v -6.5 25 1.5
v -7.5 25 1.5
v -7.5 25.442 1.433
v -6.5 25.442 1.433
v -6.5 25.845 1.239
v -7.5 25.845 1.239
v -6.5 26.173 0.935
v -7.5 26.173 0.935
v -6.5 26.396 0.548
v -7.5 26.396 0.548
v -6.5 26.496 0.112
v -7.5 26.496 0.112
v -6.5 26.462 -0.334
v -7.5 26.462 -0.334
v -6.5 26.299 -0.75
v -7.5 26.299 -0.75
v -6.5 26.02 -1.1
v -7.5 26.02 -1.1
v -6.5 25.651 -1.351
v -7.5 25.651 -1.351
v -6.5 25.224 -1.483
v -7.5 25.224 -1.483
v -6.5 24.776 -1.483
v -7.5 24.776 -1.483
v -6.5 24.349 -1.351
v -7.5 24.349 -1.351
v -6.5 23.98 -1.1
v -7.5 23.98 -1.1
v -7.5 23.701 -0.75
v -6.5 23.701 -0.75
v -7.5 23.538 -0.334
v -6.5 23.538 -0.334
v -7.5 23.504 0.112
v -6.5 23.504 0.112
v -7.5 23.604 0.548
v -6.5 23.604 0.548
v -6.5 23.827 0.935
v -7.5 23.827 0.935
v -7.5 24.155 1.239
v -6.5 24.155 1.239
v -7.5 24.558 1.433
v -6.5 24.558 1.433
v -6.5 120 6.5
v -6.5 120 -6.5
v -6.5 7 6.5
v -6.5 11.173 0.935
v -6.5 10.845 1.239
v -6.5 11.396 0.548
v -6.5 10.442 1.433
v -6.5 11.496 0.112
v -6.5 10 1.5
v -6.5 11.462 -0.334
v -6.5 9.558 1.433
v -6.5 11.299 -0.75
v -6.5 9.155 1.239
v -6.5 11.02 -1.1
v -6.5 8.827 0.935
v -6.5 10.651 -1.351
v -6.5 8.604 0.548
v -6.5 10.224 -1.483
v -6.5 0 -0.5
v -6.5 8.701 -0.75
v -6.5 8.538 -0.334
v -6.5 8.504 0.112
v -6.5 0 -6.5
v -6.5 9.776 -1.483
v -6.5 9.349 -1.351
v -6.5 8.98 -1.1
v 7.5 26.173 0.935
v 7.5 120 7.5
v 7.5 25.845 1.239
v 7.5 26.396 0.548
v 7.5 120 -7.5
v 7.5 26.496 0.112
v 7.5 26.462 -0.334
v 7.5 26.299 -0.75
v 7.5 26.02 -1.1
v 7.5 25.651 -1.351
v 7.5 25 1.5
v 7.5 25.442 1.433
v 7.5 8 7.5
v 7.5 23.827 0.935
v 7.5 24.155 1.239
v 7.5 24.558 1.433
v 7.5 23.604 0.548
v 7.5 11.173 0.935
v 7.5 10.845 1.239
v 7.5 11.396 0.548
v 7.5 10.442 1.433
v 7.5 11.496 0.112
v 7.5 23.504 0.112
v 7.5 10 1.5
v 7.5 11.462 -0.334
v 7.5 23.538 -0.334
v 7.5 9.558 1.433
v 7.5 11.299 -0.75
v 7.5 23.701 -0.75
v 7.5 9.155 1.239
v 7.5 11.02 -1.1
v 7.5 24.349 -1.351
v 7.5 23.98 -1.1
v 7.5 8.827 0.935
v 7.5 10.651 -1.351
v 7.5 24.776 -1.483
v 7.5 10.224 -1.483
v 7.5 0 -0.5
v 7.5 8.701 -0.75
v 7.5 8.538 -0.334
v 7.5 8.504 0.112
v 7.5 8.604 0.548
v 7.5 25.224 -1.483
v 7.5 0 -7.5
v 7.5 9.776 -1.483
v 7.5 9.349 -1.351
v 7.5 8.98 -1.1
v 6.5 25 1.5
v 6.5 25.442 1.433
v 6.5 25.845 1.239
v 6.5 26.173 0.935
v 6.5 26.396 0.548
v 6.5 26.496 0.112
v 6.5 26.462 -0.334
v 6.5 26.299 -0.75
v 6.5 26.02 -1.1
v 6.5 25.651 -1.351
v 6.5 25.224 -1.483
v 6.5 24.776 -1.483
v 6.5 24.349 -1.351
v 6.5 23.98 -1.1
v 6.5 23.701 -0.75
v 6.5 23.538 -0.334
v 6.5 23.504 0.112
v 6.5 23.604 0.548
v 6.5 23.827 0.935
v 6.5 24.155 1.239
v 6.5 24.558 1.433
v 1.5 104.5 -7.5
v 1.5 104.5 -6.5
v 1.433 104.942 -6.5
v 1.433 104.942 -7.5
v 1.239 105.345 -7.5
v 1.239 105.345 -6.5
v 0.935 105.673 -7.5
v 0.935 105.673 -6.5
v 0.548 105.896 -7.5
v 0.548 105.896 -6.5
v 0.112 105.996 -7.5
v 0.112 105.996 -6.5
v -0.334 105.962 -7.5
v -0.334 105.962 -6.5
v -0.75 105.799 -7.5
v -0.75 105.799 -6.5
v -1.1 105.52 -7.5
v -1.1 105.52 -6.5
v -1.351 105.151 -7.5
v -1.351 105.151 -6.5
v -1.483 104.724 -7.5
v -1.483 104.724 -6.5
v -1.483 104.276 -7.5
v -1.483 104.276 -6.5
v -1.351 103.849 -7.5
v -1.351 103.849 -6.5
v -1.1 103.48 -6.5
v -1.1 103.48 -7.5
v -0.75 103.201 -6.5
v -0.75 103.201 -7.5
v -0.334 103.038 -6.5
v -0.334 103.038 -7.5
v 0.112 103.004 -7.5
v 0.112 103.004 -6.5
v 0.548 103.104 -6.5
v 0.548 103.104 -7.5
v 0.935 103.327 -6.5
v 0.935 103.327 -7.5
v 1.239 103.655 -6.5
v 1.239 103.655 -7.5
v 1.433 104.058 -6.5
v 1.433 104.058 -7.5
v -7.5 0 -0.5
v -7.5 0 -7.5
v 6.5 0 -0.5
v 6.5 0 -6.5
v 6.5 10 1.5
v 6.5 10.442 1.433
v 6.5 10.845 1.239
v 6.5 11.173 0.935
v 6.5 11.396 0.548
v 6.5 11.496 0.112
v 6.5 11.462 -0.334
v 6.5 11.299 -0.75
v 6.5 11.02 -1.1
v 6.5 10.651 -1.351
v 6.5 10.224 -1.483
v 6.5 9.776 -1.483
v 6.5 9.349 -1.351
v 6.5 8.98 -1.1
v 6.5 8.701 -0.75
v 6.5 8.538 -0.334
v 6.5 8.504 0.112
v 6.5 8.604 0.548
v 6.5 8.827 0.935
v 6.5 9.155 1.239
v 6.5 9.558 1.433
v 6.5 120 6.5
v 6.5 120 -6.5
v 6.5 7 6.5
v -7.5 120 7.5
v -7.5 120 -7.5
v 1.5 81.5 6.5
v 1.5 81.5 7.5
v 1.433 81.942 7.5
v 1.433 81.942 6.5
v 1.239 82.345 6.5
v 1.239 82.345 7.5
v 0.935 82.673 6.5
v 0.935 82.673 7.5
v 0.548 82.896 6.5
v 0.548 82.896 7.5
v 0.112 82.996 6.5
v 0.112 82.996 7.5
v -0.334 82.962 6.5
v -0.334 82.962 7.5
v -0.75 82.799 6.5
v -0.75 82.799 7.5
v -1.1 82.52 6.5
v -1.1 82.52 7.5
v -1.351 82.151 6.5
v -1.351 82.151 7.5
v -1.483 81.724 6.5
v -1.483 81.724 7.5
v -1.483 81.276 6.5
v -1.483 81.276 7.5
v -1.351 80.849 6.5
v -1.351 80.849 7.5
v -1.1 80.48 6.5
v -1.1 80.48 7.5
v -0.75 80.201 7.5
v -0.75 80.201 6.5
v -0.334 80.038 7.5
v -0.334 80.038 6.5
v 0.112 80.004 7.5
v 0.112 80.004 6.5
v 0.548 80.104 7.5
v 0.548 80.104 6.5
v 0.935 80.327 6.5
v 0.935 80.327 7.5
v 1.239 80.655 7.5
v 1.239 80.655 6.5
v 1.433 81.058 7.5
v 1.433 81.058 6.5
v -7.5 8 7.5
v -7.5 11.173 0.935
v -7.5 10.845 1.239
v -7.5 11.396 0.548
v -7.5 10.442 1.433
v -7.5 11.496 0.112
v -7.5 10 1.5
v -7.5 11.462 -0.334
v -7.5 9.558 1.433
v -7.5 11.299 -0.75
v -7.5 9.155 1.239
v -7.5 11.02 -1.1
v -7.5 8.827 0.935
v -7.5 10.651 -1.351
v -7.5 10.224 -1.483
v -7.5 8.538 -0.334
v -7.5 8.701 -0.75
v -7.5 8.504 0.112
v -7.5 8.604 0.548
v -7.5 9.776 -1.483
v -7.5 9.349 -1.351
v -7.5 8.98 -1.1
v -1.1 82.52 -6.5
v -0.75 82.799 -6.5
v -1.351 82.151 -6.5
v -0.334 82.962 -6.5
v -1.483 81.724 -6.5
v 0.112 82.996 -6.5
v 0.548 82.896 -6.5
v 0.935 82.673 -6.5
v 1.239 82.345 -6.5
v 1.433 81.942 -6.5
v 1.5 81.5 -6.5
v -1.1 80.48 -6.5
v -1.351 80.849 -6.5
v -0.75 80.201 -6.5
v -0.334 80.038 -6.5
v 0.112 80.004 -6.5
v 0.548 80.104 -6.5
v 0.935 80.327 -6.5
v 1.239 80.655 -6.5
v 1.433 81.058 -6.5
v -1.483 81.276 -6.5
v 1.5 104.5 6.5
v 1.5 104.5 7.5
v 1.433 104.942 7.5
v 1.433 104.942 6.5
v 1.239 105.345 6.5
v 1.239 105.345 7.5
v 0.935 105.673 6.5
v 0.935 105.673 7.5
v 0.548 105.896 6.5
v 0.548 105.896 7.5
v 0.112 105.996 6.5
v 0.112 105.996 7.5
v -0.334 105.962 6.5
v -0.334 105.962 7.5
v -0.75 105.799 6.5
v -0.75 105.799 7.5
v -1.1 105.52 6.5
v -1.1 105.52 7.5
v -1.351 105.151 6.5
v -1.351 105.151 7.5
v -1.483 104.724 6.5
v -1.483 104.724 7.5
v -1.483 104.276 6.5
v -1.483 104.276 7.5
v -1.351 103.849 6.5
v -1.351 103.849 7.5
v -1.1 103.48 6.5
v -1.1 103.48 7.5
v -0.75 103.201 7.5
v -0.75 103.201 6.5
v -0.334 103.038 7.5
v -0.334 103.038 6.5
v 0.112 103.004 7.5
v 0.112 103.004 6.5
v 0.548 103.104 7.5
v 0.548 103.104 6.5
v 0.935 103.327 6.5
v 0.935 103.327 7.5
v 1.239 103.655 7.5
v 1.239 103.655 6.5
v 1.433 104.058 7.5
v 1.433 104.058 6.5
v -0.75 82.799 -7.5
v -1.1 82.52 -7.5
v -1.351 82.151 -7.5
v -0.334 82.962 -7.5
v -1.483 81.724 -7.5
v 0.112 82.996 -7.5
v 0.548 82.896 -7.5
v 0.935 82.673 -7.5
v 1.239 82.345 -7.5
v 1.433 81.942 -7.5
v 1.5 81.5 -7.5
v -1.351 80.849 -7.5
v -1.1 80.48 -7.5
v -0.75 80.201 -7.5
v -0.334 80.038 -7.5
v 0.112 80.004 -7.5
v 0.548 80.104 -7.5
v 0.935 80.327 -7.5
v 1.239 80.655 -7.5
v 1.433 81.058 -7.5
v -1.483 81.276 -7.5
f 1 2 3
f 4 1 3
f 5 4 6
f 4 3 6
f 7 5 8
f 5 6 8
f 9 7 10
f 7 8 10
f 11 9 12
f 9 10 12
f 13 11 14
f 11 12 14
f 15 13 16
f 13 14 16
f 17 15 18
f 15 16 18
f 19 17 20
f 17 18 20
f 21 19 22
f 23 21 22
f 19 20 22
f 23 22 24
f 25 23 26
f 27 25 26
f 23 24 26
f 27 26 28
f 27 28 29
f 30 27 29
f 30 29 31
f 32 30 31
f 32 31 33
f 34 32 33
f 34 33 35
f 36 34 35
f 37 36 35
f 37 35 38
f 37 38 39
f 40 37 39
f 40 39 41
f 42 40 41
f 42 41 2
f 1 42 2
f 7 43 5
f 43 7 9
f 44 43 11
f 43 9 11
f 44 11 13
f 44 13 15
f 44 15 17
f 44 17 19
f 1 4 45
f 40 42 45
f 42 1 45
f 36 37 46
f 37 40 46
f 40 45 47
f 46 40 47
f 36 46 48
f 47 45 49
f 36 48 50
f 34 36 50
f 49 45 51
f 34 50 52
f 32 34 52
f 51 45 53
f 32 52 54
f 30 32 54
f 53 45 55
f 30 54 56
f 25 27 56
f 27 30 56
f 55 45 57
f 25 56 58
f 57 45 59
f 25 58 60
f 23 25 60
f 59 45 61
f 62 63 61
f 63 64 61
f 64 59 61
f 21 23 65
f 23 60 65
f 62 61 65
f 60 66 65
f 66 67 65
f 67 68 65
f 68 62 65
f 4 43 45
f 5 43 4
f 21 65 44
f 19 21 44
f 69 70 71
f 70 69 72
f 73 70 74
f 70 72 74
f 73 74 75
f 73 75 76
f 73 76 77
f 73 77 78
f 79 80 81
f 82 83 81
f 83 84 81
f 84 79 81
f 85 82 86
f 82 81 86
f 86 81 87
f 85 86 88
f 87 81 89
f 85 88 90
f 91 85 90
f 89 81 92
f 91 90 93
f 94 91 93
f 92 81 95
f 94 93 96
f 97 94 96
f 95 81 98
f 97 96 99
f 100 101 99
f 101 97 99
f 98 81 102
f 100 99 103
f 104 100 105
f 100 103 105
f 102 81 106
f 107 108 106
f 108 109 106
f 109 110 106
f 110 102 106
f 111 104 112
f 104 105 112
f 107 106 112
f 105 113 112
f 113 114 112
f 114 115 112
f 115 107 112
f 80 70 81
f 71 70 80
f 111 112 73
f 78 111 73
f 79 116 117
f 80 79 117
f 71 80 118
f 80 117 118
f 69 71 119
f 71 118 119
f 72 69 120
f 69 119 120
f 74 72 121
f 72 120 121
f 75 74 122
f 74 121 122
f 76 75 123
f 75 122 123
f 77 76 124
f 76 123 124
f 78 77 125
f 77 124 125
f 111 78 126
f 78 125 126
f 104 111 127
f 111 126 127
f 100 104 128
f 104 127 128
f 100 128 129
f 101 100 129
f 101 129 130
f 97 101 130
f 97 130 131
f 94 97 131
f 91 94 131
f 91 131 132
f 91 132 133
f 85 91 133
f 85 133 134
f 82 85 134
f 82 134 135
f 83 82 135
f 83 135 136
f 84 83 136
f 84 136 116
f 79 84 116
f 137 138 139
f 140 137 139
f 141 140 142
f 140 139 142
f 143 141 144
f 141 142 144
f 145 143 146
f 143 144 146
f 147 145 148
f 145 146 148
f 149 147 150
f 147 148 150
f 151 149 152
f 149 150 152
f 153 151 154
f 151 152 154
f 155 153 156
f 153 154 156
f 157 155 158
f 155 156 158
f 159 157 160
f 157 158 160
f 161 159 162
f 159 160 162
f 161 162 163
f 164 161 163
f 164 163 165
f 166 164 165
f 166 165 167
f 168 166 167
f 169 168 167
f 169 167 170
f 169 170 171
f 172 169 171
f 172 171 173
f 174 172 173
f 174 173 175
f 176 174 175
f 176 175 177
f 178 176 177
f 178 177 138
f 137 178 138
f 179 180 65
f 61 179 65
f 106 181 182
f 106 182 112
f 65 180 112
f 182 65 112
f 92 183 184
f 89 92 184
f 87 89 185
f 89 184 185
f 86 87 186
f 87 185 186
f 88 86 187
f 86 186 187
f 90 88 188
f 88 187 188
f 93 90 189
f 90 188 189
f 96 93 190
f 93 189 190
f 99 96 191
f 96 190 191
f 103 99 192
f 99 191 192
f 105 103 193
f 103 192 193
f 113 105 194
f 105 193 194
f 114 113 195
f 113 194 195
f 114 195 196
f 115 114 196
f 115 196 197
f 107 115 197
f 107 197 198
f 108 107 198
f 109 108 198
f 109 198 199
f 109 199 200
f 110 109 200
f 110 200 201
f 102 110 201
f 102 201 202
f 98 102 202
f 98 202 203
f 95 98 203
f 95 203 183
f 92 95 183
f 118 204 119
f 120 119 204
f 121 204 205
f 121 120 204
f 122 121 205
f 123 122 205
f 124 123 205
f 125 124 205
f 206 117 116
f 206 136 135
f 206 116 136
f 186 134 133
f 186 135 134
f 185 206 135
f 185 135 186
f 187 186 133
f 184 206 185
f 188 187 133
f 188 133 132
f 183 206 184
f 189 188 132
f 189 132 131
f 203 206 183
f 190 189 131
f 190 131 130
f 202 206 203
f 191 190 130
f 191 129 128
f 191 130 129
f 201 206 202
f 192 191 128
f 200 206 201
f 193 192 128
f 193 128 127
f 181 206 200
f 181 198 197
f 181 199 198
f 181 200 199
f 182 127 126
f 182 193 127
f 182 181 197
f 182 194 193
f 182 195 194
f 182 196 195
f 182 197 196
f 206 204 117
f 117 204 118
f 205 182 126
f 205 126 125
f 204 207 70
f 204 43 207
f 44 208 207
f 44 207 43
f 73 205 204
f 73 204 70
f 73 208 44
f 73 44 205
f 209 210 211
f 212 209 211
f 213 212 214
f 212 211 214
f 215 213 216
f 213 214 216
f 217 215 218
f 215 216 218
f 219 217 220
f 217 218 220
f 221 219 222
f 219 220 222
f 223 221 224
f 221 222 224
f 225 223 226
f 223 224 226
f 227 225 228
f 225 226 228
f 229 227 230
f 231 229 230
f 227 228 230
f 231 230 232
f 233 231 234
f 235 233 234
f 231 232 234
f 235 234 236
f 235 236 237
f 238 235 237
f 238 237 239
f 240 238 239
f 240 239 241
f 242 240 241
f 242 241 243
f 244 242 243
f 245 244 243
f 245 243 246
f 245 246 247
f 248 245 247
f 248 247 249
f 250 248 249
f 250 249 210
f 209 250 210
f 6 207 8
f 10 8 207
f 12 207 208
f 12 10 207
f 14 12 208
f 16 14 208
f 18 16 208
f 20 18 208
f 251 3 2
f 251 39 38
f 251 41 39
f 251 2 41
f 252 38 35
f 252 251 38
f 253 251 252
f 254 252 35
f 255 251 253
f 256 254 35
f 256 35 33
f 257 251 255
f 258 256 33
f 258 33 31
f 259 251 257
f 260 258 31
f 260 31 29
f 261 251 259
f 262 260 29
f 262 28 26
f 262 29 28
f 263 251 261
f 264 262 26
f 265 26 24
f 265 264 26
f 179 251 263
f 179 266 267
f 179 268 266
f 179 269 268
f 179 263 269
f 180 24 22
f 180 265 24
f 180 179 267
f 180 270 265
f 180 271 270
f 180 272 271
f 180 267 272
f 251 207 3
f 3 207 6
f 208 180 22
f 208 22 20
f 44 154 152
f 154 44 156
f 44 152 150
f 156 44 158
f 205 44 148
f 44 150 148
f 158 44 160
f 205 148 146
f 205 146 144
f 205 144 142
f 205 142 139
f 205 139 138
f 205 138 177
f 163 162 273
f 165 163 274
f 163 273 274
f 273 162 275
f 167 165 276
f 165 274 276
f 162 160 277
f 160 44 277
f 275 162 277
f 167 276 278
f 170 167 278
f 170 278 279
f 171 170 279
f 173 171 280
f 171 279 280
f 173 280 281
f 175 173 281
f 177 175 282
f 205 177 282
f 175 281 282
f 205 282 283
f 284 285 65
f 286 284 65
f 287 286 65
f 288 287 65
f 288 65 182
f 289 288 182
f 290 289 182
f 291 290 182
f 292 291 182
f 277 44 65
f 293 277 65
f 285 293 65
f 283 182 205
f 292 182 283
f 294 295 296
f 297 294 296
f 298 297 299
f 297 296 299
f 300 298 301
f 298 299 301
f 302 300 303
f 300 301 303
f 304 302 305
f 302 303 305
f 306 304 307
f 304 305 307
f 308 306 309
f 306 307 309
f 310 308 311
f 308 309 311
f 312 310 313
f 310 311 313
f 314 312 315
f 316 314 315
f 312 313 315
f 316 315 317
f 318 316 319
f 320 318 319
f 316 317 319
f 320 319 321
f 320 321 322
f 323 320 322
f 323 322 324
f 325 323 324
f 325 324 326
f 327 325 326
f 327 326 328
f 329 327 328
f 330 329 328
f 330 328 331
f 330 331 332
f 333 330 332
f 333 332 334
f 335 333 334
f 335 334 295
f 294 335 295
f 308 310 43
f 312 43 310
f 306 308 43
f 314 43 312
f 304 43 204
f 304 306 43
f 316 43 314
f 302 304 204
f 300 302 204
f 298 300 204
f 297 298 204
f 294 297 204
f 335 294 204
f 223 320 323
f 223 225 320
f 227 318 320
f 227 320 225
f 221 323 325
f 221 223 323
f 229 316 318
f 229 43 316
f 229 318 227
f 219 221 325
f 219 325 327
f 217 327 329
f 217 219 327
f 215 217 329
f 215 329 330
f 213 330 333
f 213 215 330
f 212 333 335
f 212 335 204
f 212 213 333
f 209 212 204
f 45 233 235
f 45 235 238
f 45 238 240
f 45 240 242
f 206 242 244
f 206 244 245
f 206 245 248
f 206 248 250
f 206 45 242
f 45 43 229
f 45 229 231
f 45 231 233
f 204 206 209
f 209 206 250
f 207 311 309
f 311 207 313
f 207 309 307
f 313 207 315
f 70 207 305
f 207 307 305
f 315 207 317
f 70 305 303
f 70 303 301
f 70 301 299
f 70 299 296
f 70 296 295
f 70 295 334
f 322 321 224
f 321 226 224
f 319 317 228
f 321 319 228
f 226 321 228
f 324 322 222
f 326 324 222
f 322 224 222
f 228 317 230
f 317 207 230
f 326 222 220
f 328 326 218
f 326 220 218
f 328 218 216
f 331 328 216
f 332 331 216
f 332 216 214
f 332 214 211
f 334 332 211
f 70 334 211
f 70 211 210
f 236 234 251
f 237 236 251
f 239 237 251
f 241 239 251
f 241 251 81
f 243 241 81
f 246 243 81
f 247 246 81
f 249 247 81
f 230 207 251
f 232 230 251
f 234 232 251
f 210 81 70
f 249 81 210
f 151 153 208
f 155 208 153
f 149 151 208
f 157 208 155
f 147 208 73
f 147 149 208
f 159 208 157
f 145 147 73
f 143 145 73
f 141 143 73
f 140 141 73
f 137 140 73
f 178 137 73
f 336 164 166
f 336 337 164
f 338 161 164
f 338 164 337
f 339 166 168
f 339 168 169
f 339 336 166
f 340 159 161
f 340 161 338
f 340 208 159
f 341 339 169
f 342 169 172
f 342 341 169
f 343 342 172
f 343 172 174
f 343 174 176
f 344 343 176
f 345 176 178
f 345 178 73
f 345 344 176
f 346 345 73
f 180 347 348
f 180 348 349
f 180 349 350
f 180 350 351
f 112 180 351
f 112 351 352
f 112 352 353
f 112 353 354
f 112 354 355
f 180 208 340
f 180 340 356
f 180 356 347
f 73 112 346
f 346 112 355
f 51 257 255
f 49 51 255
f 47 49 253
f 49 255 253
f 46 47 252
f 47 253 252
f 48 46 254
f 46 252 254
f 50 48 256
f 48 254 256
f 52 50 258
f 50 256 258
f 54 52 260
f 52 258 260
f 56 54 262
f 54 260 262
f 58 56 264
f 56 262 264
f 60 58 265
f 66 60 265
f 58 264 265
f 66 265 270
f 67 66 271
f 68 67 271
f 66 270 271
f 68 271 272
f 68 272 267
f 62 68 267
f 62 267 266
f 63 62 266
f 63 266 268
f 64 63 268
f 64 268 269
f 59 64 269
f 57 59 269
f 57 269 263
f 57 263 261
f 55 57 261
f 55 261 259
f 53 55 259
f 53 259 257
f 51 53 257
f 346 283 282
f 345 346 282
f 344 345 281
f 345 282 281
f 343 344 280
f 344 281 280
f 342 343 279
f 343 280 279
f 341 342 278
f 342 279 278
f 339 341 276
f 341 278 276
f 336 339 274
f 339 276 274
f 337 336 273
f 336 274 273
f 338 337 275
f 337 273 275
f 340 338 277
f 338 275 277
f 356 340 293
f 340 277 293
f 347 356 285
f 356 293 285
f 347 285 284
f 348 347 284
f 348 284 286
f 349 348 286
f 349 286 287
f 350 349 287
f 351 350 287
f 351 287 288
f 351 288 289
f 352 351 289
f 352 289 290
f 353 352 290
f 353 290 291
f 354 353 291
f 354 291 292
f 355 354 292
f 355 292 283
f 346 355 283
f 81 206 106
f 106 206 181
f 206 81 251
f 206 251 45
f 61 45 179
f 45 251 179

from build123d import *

# Parameters (mm, degrees)
SKETCH_1_W          = 15
SKETCH_1_H          = 15
SKETCH_1_W_2        = 13
SKETCH_1_H_2        = 13
EXTRUDE_1_DEPTH     = 120
SKETCH_2_R          = 1.5
CUT_EXTRUDE_1_DEPTH = 122.166208161
SKETCH_3_R          = 1.5
CUT_EXTRUDE_2_DEPTH = 122.166208161


with BuildPart() as part:
    # 草图1 → 凸台-拉伸1 (new body)
    with BuildSketch(Plane(origin=(0, 0, 0), x_dir=(1, 0, 0), z_dir=(0, 1, 0))):
        Rectangle(SKETCH_1_W, SKETCH_1_H)
        Rectangle(SKETCH_1_W_2, SKETCH_1_H_2, mode=Mode.SUBTRACT)
    extrude(amount=EXTRUDE_1_DEPTH)

    # 草图2 → 切除-拉伸1 (cut, through all)
    with BuildSketch(Plane.XY.offset(7.5)):
        with Locations((0, 104.5)):
            Circle(SKETCH_2_R)
        with Locations((0, 81.5)):
            Circle(SKETCH_2_R)
    extrude(amount=-CUT_EXTRUDE_1_DEPTH, mode=Mode.SUBTRACT)

    # 草图3 → 切除-拉伸2 (cut, through all)
    with BuildSketch(Plane.ZY.offset(7.5)):
        with Locations((0, 10)):
            Circle(SKETCH_3_R)
        with Locations((0, 25)):
            Circle(SKETCH_3_R)
        Polygon((-0.5, 0), (7.5, 0), (7.5, 8), align=None)
    extrude(amount=-CUT_EXTRUDE_2_DEPTH, mode=Mode.SUBTRACT)


solid = part.part
